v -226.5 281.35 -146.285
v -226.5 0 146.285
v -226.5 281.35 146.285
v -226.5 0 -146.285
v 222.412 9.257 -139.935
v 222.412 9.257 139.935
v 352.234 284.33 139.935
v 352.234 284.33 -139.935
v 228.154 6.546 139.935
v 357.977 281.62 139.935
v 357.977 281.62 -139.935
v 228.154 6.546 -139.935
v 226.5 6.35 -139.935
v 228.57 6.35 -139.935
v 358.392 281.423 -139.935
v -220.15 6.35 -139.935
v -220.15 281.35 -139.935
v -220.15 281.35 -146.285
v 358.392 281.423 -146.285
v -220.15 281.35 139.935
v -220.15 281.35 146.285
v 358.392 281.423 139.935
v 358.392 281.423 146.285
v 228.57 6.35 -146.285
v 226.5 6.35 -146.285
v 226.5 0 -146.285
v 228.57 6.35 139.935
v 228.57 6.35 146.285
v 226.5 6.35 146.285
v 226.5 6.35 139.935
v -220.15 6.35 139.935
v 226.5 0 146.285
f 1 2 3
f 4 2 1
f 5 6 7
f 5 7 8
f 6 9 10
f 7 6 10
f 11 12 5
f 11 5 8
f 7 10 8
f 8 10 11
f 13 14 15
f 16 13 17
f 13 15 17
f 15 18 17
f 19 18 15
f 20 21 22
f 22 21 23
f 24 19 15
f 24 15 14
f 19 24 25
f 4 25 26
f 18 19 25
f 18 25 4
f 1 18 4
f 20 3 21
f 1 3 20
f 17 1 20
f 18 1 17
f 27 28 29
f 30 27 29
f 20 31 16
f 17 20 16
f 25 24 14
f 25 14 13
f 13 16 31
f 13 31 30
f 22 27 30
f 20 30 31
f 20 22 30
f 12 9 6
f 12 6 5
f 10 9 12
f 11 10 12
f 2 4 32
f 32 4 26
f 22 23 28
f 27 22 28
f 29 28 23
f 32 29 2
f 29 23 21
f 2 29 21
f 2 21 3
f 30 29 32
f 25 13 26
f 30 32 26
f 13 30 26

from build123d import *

# Parameters (mm, degrees)
SKETCH1_W           = 453
SKETCH1_H           = 292.569565374
BOSS_EXTRUDE1_DEPTH = 6.35
SKETCH2_W           = 6.35
SKETCH2_H           = 292.569565374
BOSS_EXTRUDE2_DEPTH = 275
BOSS_EXTRUDE3_DEPTH = 6.35
SKETCH5_W           = 279.869565374
SKETCH5_H           = 304.169578068
BOSS_EXTRUDE5_DEPTH = 6.35


with BuildPart() as part:
    # Sketch1 → Boss-Extrude1 (new body)
    with BuildSketch(Plane(origin=(0, 0, 0), x_dir=(1, 0, 0), z_dir=(0, 1, 0))):
        Rectangle(SKETCH1_W, SKETCH1_H)
    extrude(amount=BOSS_EXTRUDE1_DEPTH)

    # Sketch2 → Boss-Extrude2 (add)
    with BuildSketch(Plane(origin=(0, 6.35, 0), x_dir=(1, 0, 0), z_dir=(0, 1, 0))):
        with Locations((-223.325, 0)):
            Rectangle(SKETCH2_W, SKETCH2_H)
    extrude(amount=BOSS_EXTRUDE2_DEPTH)

    # Sketch4 → Boss-Extrude3 (add)
    with BuildSketch(Plane.XY.offset(146.284782687)):
        Polygon((358.392484654, 281.42327302), (228.570195765, 6.35), (-220.15, 6.35), (-220.15, 281.35), align=None)
    boss_extrude3 = extrude(amount=-BOSS_EXTRUDE3_DEPTH)

    # Mirror1: Boss-Extrude3 across plane
    add(boss_extrude3.mirror(Plane.XY))


with BuildPart() as body_2:
    # Sketch5 → Boss-Extrude5 (new body)
    with BuildSketch(Plane(origin=(184.065555905, -86.870714522, 0), x_dir=(0, 0, -1), z_dir=(0.904341831, -0.426808919, 0))):
        with Locations((0, 255.383157889)):
            Rectangle(SKETCH5_W, SKETCH5_H)
    extrude(amount=-BOSS_EXTRUDE5_DEPTH)


solid = Compound([part.part, body_2.part])
